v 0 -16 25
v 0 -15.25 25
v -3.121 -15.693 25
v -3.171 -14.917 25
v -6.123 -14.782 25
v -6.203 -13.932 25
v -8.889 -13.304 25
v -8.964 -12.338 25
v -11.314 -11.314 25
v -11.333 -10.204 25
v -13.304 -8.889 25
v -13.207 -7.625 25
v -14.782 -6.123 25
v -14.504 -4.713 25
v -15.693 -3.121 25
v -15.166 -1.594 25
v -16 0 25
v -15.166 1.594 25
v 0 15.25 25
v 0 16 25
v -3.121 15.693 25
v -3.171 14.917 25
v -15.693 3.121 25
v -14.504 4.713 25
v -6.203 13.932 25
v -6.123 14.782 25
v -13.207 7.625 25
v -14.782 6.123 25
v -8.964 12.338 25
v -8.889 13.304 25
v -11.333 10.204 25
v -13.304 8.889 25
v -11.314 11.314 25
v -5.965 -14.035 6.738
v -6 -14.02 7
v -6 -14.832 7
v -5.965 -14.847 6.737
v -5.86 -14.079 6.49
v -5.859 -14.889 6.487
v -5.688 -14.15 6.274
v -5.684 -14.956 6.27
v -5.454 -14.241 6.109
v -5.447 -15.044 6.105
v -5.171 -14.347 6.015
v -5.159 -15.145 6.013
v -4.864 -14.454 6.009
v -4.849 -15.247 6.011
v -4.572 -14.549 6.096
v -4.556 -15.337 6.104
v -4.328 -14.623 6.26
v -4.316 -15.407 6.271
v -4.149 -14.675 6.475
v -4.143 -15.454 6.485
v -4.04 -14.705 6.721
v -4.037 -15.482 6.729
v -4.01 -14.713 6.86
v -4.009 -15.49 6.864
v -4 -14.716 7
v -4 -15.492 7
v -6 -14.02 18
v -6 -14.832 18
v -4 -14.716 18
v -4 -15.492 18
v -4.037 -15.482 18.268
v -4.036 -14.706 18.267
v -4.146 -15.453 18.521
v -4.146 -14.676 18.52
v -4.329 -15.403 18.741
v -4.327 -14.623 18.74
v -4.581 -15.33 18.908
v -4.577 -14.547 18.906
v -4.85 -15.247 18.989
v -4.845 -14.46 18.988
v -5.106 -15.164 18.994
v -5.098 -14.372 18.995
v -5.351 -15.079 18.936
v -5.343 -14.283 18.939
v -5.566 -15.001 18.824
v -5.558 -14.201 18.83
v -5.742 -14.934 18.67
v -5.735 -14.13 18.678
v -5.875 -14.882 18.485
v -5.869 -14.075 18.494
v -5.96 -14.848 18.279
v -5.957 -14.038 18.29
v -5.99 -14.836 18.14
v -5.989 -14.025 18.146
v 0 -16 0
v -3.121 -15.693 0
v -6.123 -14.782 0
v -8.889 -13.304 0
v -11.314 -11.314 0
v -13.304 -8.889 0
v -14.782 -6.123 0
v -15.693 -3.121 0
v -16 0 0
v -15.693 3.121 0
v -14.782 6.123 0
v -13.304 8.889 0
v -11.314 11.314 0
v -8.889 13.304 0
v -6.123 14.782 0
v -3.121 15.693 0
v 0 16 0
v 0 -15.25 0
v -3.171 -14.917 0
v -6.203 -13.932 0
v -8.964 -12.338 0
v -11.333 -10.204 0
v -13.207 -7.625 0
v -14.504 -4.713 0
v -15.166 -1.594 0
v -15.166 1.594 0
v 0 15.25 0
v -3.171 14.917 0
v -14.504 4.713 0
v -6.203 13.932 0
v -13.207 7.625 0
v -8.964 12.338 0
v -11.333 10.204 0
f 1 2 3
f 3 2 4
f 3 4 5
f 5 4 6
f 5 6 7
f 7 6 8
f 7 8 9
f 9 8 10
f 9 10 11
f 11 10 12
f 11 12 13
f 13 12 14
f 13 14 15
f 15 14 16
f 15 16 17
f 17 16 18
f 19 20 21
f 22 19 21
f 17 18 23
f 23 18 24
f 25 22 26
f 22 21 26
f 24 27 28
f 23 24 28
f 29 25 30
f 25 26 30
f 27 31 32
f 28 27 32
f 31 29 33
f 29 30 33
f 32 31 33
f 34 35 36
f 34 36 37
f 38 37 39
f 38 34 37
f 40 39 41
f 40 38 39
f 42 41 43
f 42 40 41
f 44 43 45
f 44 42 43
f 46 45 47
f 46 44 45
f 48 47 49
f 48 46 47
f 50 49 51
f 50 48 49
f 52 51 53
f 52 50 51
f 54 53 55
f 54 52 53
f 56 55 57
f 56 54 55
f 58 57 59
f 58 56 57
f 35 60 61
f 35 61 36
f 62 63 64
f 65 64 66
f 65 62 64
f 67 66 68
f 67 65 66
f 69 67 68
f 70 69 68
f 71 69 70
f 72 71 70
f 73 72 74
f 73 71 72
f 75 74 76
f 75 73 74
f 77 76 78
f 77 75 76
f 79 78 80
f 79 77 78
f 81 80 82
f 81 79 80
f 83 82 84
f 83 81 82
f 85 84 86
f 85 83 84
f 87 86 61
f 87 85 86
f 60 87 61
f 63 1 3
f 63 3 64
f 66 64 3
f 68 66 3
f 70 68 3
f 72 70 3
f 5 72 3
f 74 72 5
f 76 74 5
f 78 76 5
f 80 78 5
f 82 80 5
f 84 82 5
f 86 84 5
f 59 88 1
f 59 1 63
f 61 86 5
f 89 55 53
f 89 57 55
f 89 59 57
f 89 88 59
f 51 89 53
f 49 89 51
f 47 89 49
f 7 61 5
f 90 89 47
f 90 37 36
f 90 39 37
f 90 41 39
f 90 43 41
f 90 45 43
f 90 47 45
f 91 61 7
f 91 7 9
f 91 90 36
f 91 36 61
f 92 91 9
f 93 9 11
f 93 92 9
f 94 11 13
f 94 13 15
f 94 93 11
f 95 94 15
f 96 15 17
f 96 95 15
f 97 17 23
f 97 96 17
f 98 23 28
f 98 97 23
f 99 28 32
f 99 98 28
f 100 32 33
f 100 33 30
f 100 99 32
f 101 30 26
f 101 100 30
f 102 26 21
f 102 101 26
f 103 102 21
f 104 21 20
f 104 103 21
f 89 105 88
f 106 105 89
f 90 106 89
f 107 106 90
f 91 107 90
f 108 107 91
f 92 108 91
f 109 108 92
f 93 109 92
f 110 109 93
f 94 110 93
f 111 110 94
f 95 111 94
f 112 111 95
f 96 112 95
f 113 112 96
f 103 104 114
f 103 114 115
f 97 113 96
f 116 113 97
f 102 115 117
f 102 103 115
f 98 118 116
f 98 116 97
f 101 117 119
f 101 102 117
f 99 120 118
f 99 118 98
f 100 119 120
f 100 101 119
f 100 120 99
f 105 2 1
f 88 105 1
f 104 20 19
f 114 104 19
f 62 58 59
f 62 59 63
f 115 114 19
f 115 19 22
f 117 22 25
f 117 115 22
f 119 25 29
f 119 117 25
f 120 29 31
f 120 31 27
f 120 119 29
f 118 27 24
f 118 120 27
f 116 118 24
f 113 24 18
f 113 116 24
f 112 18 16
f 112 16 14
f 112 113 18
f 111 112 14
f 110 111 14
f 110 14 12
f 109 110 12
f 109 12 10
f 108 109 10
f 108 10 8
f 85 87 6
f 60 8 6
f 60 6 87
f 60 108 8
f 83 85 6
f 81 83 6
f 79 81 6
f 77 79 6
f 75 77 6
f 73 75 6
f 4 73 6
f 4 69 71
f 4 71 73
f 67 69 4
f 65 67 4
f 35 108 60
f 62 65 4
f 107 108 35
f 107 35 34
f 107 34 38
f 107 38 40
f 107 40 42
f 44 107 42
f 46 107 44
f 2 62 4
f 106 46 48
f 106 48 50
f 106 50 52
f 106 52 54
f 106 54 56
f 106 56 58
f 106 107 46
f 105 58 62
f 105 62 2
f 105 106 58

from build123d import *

# Parameters (mm, degrees)
SALIENTE_EXTRUIR1_DEPTH = 25
CORTAR_EXTRUIR1_DEPTH   = 25


with BuildPart() as part:
    # Croquis1 → Saliente-Extruir1 (new body)
    with BuildSketch(Plane.XY):
        with BuildLine():
            Line((0, 16), (0, 15.25))
            ThreePointArc((0, 15.25), (-15.25, 0), (0, -15.25))
            Line((0, -15.25), (0, -16))
            ThreePointArc((0, -16), (-16, 0), (0, 16))
        make_face()
    extrude(amount=SALIENTE_EXTRUIR1_DEPTH)

    # Croquis2 → Cortar-Extruir1 (cut)
    with BuildSketch(Plane(origin=(0, 0, 0), x_dir=(1, 0, 0), z_dir=(0, 1, 0))):
        with BuildLine():
            Line((-4, -7), (-4, -18))
            ThreePointArc((-4, -18), (-5, -19), (-6, -18))
            Line((-6, -18), (-6, -7))
            ThreePointArc((-6, -7), (-5, -6), (-4, -7))
        make_face()
    extrude(amount=-CORTAR_EXTRUIR1_DEPTH, mode=Mode.SUBTRACT)


solid = part.part
